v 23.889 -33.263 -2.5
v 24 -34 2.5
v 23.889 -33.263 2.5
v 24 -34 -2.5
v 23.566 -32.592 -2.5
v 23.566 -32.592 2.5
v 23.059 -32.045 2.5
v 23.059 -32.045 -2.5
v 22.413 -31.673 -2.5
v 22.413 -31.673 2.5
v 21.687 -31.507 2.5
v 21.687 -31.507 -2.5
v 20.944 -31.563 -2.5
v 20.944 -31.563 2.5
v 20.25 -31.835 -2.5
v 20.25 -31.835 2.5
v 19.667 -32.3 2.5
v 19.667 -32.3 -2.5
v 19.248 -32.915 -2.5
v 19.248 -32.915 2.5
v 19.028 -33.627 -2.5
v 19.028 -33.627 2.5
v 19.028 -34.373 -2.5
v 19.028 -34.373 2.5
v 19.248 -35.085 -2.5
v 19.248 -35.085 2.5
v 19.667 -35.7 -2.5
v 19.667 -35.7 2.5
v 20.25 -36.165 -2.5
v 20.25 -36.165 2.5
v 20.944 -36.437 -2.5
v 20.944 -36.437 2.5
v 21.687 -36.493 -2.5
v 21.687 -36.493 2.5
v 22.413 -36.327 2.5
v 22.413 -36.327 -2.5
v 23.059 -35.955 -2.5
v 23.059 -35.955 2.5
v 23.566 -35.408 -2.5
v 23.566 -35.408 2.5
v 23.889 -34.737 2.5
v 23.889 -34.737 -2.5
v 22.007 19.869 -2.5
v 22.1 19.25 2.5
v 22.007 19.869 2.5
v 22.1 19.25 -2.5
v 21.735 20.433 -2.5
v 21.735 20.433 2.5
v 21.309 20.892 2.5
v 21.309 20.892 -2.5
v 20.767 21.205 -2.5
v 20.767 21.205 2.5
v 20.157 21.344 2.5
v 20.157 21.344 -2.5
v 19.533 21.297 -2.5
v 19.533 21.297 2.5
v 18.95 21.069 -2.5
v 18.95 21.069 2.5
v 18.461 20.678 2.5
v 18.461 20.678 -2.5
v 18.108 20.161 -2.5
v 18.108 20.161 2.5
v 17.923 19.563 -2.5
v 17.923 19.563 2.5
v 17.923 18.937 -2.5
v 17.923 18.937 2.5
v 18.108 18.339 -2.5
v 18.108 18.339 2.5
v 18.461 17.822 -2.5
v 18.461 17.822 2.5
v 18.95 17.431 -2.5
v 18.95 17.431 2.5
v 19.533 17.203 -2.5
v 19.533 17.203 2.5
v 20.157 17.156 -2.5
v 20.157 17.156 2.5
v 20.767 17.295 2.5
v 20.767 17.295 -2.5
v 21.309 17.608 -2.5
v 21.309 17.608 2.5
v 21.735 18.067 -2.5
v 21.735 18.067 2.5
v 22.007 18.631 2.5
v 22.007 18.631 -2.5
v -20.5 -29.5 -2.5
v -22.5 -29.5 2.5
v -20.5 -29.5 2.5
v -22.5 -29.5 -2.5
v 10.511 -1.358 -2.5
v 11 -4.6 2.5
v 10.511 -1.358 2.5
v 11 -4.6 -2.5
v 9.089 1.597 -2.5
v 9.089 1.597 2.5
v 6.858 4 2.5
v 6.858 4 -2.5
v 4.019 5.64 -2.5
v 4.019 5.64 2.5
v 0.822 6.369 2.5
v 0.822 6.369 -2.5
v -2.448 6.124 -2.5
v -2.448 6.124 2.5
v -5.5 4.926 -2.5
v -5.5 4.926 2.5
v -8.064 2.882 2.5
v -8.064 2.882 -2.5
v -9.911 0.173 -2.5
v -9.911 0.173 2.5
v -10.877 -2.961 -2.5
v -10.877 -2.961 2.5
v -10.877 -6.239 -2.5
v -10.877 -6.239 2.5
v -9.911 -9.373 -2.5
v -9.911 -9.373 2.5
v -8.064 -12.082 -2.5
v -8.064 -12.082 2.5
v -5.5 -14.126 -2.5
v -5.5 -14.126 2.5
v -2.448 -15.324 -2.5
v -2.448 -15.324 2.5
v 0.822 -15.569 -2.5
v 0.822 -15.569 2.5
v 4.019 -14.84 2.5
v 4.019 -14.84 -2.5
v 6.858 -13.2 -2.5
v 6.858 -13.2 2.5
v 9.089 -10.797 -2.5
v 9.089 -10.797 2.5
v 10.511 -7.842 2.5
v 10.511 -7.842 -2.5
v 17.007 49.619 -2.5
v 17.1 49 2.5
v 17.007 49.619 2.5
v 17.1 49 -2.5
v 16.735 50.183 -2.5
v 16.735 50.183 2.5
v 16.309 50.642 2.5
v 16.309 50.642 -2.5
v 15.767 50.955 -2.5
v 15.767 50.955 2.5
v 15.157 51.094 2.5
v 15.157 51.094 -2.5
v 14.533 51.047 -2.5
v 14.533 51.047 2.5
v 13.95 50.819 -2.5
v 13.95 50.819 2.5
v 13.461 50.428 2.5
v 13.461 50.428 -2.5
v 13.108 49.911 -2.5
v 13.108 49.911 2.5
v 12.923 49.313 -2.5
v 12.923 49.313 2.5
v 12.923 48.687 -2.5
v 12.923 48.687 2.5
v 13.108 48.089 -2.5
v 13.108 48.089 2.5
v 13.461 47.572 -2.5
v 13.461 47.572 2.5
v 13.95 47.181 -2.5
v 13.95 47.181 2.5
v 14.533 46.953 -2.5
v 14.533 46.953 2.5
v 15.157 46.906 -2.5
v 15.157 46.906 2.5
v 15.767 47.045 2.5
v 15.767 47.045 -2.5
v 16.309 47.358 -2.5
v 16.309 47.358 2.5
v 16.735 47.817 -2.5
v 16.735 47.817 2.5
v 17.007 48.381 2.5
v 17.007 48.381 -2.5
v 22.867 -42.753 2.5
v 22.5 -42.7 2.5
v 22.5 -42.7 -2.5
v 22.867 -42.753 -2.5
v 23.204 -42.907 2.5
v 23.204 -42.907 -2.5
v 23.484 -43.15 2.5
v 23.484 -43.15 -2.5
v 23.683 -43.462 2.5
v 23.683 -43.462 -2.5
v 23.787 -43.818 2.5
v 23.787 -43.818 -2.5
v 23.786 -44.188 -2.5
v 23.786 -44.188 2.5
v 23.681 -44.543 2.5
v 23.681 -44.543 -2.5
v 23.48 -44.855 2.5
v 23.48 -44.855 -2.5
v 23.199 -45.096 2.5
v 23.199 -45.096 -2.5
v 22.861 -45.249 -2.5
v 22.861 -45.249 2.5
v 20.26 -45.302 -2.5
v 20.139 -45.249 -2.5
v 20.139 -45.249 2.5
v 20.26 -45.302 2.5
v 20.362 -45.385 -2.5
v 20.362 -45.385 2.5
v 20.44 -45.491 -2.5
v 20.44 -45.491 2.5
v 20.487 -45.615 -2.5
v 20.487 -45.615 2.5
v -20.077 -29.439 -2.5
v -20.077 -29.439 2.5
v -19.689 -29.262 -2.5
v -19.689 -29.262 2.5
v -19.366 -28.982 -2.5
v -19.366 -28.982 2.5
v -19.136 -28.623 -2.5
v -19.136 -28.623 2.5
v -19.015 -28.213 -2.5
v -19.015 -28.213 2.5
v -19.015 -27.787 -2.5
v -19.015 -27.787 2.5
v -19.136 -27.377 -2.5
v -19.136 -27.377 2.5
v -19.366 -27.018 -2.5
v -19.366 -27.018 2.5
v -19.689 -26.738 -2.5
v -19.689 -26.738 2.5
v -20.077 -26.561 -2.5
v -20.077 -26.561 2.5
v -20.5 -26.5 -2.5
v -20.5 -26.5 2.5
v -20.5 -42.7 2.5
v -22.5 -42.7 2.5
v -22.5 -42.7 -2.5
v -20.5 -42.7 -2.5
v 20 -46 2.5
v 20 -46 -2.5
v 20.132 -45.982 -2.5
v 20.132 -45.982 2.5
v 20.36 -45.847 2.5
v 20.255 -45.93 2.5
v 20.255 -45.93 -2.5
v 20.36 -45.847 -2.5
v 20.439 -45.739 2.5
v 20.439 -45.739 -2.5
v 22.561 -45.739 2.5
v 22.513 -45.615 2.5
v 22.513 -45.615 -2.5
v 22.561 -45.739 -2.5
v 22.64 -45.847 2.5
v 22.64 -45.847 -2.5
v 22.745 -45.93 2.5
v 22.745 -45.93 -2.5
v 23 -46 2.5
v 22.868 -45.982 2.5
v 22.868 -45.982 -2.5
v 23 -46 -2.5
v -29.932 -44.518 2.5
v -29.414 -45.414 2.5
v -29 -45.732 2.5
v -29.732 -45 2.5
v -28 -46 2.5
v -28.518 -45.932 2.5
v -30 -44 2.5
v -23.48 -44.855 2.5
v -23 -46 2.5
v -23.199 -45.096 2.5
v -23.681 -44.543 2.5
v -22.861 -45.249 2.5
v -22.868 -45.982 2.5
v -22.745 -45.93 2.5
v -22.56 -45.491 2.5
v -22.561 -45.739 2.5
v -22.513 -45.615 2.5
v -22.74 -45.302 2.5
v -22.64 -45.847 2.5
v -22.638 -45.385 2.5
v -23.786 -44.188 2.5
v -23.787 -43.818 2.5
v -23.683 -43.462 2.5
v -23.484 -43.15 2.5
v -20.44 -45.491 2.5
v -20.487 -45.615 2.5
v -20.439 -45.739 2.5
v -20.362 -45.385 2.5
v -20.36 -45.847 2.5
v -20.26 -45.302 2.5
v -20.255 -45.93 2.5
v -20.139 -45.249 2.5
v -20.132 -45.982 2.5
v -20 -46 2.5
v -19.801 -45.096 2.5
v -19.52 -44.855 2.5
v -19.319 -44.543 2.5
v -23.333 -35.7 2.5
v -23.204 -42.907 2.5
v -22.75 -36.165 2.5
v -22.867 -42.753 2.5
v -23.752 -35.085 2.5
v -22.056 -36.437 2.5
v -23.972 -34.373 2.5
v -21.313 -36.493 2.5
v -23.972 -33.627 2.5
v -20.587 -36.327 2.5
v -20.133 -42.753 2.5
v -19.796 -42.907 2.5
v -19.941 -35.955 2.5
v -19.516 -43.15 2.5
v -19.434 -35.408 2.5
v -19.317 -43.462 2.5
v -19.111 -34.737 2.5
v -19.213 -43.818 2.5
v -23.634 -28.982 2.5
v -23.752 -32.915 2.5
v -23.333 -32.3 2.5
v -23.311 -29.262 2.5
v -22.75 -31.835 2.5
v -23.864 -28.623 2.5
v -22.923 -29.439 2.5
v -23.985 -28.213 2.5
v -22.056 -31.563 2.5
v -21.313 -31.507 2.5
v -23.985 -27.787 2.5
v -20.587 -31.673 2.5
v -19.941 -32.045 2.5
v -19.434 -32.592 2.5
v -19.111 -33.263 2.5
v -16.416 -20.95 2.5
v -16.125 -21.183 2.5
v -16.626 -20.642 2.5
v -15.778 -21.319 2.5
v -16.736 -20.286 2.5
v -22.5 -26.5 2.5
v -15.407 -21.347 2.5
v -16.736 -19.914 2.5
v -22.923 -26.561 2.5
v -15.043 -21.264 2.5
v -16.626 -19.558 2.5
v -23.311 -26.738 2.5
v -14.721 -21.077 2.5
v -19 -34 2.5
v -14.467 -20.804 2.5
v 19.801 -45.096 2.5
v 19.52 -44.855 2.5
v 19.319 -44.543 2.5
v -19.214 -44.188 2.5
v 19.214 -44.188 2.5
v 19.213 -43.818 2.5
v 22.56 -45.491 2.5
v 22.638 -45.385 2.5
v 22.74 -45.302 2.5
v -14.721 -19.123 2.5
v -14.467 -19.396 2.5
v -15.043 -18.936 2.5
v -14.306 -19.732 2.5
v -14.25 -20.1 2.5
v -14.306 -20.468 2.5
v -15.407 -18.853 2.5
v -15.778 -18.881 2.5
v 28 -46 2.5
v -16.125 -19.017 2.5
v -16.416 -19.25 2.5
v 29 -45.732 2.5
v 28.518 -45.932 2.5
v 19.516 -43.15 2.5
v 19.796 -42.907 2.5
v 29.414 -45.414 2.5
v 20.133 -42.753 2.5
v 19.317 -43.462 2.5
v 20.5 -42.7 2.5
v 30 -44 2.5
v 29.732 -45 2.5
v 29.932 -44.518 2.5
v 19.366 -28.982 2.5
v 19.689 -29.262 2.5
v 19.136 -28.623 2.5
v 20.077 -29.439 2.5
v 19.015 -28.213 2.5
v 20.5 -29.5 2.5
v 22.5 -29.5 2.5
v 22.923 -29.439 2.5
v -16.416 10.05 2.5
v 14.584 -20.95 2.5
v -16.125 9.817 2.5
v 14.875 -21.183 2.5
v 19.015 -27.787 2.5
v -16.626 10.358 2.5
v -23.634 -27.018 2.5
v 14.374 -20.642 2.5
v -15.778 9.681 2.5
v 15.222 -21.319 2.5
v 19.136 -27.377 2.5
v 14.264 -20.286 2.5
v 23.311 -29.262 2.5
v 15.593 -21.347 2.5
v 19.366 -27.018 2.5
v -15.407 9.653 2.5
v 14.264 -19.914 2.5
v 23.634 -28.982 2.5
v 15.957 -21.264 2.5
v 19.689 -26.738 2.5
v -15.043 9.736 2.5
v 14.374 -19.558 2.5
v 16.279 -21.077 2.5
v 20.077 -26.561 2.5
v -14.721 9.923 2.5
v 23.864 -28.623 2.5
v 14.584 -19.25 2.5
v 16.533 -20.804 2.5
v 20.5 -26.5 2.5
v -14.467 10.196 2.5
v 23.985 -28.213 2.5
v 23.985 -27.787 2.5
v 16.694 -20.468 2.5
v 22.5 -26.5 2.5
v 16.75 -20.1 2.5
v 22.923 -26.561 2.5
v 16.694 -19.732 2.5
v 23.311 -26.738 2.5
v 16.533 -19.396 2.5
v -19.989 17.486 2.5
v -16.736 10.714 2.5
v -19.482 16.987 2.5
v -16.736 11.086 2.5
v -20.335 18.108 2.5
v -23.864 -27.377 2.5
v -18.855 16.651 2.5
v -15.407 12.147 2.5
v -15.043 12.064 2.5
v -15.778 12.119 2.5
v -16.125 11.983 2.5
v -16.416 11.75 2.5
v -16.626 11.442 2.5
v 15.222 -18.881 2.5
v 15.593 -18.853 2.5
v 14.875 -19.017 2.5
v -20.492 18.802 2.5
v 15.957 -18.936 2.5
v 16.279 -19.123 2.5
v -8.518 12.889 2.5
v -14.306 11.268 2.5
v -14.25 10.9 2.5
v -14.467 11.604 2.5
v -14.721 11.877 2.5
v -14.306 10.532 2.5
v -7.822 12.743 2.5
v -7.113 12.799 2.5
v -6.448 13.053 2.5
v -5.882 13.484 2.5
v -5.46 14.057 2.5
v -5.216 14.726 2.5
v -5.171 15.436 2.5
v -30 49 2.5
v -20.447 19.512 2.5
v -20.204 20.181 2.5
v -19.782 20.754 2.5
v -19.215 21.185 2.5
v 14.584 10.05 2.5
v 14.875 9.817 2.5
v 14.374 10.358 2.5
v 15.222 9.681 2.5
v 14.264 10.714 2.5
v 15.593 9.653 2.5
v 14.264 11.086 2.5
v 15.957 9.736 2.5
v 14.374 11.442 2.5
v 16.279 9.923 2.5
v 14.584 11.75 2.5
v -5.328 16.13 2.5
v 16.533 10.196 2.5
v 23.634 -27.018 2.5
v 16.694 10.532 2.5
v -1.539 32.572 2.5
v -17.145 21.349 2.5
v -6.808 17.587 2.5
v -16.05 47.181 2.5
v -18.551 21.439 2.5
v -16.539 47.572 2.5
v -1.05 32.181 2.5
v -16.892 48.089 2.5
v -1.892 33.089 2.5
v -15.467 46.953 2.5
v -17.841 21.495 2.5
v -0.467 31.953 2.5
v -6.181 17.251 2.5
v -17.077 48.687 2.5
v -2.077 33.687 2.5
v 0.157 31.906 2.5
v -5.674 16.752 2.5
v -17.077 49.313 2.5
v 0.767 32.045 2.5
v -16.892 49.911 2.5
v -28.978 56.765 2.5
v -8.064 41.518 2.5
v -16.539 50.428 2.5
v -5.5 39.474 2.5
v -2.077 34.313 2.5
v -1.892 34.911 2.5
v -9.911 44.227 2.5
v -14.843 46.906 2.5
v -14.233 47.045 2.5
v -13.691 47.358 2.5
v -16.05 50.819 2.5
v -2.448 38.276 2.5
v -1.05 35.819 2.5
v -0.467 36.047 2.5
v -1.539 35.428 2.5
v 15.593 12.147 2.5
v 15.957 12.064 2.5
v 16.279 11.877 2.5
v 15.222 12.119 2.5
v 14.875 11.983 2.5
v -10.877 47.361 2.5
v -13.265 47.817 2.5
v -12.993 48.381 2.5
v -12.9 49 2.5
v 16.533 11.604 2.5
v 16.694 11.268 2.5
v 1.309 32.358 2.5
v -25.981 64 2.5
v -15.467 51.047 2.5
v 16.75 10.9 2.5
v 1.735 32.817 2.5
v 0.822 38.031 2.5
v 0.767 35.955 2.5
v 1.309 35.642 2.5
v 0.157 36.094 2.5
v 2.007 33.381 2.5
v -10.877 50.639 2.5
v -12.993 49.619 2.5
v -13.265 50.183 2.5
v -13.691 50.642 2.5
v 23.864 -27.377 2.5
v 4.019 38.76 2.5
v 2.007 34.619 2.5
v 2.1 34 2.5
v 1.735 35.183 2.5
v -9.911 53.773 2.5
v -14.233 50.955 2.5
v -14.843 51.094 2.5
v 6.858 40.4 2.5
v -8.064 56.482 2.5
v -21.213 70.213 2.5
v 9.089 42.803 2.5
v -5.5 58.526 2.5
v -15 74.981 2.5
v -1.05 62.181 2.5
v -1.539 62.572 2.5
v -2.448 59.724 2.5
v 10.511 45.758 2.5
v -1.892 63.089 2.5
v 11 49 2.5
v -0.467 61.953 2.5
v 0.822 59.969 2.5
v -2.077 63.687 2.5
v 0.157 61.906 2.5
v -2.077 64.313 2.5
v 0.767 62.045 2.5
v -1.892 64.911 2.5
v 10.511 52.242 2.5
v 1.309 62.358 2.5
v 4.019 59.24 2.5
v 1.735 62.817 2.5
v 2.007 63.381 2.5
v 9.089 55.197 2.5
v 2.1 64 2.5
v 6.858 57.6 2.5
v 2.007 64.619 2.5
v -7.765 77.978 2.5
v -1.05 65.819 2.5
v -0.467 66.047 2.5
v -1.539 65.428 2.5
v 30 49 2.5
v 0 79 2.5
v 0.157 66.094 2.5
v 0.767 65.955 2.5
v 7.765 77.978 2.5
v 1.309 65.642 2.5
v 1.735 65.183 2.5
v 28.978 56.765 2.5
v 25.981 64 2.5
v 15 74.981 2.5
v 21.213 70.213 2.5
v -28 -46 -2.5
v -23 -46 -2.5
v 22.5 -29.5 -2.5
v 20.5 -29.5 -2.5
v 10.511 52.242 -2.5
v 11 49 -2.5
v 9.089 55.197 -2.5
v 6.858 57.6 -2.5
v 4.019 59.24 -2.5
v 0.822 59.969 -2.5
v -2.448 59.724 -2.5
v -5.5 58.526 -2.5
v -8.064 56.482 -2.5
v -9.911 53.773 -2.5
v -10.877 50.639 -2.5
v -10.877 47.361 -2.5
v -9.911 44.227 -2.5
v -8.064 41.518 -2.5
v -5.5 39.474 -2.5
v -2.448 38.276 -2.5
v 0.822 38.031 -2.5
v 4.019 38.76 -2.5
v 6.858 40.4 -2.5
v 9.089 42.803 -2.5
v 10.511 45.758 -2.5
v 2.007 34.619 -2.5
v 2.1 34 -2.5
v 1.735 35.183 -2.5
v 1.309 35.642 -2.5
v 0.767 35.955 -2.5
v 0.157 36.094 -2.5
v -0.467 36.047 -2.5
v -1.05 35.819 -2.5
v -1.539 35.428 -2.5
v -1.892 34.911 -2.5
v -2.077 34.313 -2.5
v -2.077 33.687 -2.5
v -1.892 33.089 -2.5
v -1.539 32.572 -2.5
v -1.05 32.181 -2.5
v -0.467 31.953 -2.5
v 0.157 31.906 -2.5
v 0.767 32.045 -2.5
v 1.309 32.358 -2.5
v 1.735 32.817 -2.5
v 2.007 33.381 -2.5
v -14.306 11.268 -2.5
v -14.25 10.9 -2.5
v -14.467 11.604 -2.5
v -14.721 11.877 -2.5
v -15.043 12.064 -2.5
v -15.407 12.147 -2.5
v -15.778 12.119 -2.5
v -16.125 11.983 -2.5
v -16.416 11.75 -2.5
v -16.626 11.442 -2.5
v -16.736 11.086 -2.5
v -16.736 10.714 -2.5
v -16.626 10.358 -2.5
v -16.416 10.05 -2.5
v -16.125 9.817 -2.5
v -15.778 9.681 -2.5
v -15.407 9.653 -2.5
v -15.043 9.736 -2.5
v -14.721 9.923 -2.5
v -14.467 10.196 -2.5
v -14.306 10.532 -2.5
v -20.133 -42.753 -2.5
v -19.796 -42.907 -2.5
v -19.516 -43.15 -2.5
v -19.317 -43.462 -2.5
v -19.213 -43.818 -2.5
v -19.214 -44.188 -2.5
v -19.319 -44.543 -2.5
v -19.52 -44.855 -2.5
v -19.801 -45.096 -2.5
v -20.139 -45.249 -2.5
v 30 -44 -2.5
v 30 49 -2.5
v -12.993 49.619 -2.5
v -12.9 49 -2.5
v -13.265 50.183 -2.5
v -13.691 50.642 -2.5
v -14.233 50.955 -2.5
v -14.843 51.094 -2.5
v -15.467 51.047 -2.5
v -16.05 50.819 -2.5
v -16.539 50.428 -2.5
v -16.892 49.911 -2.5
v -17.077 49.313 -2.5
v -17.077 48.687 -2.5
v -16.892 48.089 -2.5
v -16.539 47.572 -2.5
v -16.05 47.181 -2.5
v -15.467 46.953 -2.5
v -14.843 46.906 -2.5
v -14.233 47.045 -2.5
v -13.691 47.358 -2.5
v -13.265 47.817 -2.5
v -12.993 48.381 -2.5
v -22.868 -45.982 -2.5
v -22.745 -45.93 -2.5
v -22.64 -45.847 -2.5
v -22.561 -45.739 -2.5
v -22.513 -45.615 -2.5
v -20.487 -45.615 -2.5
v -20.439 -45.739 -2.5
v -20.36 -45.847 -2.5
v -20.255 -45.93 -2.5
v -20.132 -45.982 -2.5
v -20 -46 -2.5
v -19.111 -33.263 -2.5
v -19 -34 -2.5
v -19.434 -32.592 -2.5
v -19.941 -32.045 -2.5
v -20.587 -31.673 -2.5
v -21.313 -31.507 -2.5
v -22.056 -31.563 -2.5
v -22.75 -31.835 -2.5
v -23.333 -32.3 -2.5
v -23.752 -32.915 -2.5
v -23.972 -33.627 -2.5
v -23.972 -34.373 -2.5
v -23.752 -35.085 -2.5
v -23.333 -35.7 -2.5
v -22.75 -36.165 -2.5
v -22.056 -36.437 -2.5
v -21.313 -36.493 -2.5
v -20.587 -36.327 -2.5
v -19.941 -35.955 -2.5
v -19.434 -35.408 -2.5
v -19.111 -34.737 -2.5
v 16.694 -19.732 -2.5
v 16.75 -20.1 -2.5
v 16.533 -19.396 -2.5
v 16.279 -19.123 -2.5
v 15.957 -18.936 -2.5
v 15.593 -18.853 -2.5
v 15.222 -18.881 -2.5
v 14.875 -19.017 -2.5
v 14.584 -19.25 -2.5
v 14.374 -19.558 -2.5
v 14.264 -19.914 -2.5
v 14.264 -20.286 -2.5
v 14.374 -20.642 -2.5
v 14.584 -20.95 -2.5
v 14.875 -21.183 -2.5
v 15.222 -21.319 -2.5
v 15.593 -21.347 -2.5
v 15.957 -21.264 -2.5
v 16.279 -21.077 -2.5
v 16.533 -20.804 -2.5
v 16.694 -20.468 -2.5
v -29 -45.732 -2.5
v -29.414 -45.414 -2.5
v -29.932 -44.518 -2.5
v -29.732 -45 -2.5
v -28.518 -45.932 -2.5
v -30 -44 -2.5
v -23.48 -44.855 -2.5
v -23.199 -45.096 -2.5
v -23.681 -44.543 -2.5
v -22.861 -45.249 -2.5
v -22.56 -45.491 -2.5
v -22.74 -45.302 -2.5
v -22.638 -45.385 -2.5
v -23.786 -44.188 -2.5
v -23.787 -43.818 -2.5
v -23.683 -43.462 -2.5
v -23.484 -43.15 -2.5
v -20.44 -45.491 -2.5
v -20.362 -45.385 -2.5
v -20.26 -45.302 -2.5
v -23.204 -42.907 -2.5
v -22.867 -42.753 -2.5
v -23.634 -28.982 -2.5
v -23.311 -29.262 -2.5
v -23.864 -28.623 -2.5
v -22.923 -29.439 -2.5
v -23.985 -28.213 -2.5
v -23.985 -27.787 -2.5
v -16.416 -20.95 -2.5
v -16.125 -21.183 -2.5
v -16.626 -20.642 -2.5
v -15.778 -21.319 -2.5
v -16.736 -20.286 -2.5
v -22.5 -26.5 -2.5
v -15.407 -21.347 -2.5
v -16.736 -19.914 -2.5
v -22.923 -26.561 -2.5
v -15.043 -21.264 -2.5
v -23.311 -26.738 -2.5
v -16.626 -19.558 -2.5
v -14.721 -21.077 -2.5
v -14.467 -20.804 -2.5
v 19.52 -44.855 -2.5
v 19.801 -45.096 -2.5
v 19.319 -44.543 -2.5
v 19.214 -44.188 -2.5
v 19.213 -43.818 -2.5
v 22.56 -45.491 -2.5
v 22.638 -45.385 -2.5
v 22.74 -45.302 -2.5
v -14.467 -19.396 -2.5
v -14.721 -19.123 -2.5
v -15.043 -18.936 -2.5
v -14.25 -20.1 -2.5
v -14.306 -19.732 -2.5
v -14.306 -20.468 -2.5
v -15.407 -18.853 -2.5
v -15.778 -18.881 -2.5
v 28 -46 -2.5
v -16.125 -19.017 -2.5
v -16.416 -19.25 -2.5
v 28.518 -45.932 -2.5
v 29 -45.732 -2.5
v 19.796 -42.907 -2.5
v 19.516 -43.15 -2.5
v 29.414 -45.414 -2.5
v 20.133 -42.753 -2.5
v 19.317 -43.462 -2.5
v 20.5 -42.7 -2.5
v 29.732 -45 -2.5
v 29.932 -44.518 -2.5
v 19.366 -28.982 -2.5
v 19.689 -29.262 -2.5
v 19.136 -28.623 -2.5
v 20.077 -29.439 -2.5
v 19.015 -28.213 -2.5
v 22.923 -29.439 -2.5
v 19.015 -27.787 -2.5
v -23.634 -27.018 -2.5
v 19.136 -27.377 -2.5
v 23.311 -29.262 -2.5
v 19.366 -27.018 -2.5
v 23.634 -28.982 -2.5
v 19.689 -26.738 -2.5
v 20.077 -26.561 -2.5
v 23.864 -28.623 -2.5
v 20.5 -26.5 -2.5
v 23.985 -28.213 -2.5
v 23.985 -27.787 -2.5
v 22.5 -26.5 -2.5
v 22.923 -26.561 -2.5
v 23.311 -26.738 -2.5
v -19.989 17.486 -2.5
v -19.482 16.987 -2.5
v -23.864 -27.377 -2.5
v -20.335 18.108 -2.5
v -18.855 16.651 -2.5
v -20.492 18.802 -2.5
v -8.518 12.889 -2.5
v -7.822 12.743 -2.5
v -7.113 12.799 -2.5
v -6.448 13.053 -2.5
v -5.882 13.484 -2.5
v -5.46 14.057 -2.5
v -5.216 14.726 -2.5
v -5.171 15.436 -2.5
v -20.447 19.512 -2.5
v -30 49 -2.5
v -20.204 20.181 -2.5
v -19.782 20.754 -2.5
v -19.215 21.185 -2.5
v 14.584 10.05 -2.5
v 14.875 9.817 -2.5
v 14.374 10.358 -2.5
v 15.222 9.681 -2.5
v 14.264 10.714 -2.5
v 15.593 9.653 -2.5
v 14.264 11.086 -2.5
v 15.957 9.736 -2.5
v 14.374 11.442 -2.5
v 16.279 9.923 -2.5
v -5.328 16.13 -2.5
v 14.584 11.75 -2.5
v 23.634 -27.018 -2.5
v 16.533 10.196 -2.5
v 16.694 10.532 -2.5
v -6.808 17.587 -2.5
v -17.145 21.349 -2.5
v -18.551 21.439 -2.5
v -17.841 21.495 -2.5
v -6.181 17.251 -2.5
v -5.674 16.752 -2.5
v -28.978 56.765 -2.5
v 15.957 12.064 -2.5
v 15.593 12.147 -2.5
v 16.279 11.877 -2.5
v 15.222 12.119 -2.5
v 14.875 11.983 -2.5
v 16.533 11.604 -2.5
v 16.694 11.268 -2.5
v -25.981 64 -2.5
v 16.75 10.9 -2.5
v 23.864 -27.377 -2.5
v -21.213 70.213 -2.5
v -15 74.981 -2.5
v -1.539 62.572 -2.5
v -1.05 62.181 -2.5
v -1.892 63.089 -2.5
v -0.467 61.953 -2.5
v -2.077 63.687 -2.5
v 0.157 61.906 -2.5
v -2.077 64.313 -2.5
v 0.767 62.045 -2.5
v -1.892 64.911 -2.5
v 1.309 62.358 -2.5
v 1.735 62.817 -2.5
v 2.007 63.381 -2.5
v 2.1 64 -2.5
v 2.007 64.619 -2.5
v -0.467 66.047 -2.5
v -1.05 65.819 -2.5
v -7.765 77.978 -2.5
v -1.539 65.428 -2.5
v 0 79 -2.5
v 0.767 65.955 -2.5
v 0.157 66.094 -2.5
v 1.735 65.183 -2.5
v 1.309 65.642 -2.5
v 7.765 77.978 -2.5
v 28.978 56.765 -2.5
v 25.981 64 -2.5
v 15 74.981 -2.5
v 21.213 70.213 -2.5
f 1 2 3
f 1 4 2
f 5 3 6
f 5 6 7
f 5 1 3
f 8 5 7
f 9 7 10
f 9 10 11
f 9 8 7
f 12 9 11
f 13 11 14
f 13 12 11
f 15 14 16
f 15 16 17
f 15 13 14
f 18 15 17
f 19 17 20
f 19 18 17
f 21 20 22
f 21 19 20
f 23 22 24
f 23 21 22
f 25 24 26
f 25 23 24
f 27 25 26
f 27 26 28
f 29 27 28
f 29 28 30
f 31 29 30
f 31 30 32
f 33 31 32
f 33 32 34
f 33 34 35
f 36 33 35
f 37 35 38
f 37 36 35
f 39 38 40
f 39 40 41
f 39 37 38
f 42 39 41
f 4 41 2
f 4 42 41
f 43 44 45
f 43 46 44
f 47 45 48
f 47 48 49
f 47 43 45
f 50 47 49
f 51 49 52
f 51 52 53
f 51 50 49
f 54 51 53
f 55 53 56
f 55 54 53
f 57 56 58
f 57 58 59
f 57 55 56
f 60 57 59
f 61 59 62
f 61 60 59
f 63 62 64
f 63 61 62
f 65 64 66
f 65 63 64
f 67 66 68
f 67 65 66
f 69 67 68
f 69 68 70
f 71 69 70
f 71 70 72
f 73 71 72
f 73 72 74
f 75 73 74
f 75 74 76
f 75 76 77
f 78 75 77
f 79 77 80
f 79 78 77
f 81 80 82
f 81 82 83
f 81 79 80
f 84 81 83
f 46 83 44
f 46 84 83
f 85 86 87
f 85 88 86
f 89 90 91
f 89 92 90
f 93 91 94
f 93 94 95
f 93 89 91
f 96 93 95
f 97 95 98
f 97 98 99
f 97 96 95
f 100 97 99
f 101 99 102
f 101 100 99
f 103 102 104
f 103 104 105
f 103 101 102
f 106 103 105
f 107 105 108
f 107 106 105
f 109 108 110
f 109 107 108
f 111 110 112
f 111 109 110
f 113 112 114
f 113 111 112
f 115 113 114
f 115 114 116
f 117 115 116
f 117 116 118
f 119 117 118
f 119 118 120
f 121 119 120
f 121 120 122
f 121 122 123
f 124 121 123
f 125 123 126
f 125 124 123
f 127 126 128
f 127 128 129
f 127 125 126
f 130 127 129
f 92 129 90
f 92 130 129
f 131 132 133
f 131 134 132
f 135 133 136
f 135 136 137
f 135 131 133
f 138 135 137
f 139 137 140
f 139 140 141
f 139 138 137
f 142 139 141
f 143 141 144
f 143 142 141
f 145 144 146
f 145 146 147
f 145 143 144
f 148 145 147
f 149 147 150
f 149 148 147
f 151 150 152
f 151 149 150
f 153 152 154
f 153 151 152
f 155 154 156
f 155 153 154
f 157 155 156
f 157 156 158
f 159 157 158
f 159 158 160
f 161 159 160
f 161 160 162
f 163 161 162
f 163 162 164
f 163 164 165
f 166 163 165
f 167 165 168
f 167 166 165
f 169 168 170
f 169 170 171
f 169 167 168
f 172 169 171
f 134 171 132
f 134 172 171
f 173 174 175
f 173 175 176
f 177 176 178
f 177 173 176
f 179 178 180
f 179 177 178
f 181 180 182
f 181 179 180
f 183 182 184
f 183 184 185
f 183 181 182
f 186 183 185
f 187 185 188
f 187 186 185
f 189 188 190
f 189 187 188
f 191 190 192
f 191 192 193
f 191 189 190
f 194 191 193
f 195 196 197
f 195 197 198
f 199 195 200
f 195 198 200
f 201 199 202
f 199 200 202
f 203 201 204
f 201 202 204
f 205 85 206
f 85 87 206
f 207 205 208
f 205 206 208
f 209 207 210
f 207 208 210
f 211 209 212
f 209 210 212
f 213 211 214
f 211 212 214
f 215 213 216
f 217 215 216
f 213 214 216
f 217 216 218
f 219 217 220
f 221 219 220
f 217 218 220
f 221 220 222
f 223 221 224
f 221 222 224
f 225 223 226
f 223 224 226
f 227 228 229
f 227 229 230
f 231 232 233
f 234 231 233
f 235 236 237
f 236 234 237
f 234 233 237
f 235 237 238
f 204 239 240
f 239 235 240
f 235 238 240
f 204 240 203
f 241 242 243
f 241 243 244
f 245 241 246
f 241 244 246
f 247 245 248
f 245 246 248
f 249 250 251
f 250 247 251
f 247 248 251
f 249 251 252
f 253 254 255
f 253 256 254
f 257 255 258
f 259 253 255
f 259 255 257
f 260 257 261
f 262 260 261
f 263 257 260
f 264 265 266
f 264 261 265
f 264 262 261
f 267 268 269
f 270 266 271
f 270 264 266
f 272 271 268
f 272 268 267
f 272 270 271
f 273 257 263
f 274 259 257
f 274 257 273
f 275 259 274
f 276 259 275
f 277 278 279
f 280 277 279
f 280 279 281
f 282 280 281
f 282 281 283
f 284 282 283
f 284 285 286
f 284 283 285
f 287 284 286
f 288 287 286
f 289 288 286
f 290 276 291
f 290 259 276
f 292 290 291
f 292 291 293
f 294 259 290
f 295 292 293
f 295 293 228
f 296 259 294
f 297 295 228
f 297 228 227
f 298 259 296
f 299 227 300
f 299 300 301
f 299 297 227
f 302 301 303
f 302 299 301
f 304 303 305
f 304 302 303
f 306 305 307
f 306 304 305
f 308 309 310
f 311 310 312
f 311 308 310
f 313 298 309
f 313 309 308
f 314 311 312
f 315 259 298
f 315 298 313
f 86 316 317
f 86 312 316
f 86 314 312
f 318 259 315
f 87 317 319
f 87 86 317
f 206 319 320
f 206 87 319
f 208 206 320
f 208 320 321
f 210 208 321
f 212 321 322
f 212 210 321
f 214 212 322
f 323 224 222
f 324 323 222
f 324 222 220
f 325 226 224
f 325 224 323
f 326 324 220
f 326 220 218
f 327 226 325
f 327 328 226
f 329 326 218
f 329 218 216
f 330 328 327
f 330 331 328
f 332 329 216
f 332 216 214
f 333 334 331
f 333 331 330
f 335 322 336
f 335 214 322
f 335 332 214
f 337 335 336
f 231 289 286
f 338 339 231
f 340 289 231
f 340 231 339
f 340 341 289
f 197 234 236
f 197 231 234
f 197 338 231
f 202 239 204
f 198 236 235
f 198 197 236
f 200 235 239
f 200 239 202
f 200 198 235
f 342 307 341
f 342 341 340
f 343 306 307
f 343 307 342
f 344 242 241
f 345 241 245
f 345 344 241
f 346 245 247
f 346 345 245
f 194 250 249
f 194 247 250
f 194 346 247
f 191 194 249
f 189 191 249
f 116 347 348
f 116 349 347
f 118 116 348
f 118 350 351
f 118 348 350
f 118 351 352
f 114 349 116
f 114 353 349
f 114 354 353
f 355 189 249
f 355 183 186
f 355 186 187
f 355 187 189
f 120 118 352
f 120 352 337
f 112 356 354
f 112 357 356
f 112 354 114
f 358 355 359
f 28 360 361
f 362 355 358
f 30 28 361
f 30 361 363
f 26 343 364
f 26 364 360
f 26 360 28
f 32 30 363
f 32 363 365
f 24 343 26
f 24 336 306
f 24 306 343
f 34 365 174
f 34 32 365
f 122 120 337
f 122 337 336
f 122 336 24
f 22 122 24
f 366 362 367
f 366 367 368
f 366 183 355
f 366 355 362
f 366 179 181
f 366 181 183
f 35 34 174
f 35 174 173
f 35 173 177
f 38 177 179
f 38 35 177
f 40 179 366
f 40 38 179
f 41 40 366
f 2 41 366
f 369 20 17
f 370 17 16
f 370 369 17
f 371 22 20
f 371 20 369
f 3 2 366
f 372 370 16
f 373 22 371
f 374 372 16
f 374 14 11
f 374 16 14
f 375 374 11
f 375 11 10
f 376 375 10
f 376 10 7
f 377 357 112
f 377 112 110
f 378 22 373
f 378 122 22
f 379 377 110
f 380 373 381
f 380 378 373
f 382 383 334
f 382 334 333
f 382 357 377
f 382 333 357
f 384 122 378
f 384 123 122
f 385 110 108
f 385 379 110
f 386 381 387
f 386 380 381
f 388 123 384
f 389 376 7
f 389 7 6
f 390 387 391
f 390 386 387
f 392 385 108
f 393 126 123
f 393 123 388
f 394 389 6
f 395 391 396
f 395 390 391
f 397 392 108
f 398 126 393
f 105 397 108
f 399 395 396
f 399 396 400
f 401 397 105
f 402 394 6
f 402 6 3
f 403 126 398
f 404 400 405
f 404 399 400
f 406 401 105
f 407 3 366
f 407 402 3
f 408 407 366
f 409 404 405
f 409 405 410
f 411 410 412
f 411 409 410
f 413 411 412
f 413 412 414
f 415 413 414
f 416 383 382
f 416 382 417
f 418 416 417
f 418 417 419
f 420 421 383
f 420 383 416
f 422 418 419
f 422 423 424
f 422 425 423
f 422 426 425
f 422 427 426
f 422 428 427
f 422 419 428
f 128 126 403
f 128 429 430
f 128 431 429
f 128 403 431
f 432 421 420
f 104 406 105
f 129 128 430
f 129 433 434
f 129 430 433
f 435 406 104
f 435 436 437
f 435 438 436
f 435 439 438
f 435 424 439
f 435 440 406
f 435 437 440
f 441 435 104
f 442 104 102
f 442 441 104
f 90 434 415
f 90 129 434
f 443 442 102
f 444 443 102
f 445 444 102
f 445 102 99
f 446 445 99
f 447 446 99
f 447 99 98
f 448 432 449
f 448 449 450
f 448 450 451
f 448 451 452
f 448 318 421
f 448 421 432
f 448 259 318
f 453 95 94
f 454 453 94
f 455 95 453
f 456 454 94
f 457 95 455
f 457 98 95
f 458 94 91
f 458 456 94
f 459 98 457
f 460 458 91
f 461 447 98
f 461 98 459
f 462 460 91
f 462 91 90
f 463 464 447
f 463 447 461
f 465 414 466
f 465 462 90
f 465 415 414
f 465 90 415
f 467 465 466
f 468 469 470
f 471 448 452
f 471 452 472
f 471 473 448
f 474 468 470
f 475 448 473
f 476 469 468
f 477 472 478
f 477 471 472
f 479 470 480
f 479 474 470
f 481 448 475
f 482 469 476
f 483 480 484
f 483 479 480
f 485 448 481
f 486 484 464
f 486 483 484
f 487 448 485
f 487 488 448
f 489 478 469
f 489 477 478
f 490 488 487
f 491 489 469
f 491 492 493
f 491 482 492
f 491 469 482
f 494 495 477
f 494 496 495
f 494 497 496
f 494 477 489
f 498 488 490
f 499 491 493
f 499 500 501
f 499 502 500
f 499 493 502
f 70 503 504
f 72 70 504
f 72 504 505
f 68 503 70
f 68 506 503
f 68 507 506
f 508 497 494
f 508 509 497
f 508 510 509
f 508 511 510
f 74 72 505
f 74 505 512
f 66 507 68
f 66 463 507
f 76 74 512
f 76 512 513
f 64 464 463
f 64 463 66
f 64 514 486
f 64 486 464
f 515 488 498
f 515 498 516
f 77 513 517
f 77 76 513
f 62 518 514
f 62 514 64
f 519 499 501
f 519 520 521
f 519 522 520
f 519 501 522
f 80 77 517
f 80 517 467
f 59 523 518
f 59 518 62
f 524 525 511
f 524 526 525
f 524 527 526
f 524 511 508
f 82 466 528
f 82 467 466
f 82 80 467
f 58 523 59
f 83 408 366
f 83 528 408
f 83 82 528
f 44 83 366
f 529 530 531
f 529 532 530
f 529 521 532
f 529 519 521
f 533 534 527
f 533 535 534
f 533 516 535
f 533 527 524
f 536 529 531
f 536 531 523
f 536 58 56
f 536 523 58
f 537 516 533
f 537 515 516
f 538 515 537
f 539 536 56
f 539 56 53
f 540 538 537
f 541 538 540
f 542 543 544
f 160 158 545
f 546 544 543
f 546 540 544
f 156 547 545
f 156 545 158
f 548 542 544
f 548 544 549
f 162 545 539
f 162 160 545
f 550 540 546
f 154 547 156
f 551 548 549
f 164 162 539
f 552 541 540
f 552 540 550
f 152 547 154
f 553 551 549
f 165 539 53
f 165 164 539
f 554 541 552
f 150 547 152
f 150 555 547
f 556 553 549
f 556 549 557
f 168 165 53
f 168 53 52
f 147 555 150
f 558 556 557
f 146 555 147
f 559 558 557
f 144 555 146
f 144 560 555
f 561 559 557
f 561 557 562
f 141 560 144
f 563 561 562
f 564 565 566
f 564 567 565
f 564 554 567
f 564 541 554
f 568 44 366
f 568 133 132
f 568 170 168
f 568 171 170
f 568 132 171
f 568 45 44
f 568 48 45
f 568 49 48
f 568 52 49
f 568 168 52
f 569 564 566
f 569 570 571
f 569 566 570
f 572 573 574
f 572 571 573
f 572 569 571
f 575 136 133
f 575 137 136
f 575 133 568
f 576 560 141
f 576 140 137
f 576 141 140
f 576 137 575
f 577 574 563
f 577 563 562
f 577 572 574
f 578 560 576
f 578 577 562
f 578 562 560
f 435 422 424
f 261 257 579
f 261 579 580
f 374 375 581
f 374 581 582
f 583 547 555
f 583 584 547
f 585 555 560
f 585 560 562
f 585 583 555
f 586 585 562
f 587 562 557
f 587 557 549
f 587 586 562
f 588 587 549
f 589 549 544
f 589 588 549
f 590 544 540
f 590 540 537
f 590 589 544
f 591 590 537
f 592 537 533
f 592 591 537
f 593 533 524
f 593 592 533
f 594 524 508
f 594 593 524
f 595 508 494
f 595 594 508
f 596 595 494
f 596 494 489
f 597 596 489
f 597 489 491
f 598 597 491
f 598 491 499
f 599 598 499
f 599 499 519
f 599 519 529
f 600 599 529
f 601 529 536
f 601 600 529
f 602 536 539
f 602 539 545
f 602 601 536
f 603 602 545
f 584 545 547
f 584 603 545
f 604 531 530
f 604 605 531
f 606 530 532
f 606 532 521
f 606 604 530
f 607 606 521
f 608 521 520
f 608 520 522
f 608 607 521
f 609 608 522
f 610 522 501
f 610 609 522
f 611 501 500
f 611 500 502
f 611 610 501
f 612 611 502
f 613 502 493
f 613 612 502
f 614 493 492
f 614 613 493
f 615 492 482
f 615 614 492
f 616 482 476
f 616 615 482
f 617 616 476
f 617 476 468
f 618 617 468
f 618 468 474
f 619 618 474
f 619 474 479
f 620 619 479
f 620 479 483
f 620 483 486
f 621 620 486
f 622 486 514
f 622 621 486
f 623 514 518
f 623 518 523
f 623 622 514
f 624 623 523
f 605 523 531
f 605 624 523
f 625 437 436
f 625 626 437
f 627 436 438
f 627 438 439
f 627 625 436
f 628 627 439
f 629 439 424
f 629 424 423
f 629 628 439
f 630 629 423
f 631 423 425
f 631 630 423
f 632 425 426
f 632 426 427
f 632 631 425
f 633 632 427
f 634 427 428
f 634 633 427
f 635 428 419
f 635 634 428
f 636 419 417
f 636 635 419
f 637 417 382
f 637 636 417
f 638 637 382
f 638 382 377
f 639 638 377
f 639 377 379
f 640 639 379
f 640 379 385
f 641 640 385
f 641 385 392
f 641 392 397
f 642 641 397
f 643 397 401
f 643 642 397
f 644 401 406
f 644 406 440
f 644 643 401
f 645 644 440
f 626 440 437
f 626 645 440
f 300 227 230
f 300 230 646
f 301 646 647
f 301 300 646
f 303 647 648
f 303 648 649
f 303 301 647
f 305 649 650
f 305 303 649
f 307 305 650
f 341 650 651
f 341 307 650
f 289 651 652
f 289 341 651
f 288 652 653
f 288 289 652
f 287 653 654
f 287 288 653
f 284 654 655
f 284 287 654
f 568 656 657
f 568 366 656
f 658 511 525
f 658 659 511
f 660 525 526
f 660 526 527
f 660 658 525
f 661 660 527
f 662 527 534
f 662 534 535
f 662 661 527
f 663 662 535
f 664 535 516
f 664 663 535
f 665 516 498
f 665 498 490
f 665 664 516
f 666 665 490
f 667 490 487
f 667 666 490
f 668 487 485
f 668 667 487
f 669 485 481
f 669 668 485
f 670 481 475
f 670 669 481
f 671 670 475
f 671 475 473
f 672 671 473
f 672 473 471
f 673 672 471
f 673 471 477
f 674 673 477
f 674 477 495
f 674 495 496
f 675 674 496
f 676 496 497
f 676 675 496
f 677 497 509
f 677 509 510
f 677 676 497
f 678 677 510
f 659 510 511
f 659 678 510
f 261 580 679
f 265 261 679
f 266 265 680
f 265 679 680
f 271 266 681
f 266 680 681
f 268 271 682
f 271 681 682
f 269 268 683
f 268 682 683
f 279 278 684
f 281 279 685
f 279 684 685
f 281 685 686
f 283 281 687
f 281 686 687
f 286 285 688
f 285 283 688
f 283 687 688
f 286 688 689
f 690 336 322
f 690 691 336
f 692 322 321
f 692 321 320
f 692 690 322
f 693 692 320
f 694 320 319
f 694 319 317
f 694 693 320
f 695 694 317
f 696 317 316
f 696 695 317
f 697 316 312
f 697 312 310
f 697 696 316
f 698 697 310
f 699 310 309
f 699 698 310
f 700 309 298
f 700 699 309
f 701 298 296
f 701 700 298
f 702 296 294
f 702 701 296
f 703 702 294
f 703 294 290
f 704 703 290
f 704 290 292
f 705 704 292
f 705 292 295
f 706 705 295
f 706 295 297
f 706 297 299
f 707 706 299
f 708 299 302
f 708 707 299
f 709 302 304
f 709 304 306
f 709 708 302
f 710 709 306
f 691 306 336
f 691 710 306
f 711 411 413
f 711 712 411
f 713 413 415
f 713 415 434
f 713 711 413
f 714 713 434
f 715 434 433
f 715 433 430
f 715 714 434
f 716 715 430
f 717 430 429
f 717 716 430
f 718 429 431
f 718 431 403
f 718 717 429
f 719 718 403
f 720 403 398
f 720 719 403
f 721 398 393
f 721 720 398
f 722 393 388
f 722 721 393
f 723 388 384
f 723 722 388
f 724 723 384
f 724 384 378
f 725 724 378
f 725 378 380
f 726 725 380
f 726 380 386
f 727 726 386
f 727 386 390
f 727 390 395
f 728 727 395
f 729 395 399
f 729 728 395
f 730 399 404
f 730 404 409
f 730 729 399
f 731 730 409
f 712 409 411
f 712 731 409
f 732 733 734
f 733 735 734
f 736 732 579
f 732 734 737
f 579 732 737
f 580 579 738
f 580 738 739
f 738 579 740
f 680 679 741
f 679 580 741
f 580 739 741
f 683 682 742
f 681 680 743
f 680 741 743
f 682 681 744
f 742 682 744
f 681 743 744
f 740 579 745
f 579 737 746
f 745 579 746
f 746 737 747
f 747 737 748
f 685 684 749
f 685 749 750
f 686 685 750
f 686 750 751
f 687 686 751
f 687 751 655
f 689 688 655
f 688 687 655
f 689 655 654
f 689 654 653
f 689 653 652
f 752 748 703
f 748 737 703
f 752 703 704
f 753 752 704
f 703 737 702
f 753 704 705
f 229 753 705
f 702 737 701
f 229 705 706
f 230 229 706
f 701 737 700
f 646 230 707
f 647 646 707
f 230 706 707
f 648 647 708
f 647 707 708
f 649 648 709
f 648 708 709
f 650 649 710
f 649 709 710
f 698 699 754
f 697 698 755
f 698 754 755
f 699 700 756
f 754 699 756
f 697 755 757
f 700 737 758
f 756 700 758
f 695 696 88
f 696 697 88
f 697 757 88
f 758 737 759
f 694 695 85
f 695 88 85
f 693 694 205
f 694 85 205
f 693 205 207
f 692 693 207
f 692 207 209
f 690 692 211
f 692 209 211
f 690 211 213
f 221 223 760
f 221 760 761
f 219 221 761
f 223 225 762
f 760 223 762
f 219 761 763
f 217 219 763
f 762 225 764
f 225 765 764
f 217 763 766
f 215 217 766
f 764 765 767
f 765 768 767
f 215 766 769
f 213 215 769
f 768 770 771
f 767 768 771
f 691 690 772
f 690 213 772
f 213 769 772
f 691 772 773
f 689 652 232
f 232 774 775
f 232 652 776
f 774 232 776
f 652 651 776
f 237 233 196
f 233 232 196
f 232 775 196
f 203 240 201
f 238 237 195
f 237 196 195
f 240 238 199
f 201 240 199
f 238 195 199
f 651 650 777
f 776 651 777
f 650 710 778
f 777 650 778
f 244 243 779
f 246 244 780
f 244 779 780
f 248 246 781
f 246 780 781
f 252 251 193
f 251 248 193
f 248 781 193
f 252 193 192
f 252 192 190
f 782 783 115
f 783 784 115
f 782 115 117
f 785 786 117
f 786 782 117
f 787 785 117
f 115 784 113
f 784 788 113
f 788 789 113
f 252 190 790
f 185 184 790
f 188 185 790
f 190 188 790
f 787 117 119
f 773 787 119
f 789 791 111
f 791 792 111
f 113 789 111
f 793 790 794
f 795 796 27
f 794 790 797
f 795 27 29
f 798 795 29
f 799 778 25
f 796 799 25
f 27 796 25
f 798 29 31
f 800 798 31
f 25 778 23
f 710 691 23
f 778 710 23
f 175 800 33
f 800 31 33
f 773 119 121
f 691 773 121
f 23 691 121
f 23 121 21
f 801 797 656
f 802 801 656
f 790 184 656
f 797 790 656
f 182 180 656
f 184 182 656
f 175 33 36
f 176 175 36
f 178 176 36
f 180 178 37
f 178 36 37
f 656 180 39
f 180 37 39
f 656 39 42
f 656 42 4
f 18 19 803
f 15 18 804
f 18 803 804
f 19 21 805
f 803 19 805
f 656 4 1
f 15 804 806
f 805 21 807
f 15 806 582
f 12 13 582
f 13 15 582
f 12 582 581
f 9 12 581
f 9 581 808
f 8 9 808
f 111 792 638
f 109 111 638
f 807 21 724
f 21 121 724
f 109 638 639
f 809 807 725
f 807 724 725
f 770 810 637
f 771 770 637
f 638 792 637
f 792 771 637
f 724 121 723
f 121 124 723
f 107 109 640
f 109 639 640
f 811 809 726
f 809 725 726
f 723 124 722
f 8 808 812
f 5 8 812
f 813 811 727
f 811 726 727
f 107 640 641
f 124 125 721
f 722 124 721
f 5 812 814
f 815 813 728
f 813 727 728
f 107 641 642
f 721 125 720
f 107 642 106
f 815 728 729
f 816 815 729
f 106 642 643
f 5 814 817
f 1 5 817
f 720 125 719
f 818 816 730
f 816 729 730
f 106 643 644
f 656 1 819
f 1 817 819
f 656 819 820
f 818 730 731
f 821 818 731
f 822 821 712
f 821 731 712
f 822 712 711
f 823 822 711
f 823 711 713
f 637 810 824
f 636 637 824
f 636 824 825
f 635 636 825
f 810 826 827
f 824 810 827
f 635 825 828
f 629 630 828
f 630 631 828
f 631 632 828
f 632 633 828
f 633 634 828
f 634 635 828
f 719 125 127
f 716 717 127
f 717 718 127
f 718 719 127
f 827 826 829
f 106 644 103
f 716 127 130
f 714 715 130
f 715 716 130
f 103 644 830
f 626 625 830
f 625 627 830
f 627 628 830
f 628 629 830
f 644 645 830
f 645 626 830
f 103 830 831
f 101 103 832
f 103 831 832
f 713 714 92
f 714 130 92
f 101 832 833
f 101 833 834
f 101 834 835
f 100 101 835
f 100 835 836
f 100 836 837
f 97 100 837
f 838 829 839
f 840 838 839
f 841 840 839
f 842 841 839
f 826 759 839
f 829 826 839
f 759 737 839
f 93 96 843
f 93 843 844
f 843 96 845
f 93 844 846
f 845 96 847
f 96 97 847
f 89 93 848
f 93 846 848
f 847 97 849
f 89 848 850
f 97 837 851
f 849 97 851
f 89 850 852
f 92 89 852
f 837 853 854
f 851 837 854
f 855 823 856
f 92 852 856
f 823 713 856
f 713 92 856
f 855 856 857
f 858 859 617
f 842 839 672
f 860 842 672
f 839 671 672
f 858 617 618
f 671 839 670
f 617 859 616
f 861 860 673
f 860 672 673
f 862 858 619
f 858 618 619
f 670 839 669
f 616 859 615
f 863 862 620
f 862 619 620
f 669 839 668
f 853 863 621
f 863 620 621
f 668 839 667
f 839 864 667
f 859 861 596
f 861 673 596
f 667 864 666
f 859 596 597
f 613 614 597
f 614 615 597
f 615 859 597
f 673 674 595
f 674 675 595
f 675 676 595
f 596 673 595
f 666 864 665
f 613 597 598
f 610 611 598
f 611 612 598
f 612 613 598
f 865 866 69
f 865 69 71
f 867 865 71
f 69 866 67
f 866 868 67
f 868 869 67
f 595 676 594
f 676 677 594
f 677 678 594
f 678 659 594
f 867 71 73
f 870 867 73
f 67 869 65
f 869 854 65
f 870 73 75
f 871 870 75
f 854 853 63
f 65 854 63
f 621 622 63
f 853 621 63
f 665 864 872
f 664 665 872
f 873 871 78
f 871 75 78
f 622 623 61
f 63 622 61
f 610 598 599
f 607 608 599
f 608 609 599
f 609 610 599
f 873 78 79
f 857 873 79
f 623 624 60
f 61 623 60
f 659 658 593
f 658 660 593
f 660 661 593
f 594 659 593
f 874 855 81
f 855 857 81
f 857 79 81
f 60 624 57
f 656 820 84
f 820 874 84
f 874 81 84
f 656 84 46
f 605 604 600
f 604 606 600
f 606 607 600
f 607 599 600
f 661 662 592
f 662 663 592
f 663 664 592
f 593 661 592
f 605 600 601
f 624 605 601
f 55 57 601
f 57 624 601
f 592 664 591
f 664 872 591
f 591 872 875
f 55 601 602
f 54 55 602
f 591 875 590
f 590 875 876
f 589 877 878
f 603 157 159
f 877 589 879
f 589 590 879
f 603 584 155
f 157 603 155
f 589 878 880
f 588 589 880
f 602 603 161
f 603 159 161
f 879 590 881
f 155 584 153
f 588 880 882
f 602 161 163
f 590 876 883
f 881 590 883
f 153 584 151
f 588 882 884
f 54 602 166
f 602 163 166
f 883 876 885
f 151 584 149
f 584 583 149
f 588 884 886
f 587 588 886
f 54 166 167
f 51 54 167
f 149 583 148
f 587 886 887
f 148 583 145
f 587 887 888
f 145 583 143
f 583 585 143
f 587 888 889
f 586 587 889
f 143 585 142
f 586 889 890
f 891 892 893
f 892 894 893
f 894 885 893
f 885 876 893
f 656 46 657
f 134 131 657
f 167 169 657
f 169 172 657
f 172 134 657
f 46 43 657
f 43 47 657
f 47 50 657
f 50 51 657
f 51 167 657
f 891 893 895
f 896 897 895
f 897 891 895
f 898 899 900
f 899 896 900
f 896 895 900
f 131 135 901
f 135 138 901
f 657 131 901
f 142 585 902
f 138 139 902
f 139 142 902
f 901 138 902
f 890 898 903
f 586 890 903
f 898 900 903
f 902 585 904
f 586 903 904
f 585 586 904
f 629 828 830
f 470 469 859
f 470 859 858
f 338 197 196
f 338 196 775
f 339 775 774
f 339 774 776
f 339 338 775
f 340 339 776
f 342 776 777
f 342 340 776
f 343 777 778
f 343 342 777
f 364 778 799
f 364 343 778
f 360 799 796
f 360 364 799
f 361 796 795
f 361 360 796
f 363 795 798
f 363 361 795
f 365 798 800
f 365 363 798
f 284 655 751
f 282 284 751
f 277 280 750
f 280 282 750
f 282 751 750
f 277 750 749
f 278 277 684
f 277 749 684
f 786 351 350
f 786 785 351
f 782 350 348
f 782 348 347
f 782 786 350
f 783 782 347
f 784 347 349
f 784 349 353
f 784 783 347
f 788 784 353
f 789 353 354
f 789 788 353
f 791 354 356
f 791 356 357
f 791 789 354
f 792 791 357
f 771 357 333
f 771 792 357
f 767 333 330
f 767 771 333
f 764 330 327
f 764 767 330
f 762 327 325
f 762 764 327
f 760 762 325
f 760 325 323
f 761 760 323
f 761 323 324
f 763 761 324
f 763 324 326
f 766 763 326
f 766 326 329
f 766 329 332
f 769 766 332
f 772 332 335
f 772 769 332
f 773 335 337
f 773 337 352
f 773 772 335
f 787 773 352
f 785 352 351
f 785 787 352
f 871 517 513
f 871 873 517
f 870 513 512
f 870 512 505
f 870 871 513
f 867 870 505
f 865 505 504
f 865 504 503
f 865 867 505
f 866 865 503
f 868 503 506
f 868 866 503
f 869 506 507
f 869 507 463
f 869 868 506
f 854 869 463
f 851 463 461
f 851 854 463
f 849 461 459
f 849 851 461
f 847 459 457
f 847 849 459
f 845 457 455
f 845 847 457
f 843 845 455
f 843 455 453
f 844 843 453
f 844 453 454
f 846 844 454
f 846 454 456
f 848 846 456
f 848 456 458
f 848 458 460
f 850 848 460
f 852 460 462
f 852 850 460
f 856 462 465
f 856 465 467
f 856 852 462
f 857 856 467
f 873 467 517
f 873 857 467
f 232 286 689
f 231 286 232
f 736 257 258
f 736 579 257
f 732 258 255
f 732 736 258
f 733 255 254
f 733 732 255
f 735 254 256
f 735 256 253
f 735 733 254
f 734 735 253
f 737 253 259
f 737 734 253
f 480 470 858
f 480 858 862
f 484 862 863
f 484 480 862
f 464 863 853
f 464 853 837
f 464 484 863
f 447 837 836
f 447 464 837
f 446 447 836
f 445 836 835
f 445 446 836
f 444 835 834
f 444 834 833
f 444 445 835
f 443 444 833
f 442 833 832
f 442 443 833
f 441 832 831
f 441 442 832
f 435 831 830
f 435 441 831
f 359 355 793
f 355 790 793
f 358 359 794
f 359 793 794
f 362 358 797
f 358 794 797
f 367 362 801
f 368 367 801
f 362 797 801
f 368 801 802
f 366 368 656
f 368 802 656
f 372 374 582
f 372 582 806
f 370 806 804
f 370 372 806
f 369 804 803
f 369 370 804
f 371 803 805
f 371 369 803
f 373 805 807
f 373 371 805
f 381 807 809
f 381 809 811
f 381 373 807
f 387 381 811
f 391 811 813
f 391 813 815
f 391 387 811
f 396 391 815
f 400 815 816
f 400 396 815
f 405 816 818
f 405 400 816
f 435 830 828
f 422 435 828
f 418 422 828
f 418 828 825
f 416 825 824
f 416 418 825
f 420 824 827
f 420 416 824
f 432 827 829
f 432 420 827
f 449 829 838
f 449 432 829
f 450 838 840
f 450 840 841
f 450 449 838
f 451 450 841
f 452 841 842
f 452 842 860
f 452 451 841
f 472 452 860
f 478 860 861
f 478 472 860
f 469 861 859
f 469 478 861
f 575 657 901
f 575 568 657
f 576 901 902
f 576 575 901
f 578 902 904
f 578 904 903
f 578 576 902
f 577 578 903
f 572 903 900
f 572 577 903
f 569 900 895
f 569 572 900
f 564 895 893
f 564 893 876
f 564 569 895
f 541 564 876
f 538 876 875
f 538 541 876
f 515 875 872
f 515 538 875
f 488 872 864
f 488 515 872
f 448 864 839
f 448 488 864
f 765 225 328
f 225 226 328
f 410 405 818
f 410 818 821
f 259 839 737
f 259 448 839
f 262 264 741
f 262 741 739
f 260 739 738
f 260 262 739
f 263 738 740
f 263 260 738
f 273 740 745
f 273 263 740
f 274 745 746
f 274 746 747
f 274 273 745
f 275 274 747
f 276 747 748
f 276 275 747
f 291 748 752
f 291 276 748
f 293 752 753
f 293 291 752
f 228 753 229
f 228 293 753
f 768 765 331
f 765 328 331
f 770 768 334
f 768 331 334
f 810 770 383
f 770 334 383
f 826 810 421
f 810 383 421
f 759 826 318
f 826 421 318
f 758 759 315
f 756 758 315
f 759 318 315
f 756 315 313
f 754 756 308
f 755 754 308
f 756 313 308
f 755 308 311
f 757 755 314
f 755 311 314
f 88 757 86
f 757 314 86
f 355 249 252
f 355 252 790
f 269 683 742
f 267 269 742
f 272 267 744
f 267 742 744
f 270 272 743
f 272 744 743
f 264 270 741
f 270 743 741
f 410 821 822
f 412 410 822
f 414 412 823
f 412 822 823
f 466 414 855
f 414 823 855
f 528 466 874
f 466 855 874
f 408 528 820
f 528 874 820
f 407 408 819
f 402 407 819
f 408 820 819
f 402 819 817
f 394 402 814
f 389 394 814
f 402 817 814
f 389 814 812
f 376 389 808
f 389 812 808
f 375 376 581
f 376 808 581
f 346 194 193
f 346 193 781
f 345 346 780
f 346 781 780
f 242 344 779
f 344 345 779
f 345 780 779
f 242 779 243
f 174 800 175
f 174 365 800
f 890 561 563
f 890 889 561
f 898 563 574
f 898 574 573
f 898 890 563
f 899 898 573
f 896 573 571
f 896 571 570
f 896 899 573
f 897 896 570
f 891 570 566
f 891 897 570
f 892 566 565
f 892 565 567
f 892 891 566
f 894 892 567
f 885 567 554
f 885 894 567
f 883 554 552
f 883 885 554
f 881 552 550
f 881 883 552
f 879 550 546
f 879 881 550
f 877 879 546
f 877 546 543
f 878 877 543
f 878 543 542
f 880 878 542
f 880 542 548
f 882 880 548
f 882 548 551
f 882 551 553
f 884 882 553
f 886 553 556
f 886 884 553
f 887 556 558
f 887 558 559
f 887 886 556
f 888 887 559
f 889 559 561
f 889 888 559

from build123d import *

# Parameters (mm, degrees)
SKETCH1_R           = 11
SKETCH1_R_2         = 1.25
SKETCH1_R_3         = 2.5
SKETCH1_R_4         = 2.1
BOSS_EXTRUDE1_DEPTH = 2.5
FILLET1_R           = 0.5
FILLET2_R           = 2


with BuildPart() as part:
    # Sketch1 → Boss-Extrude1 (new, symmetric)
    with BuildSketch(Plane.XY):
        with BuildLine():
            Line((-30, -46), (-22.5, -46))
            Line((-22.5, -46), (-22.5, -45.3))
            ThreePointArc((-22.5, -45.3), (-23.8, -44), (-22.5, -42.7))
            Line((-22.5, -42.7), (-20.5, -42.7))
            ThreePointArc((-20.5, -42.7), (-19.2, -44), (-20.5, -45.3))
            Line((-20.5, -45.3), (-20.5, -46))
            Line((-20.5, -46), (20.5, -46))
            Line((20.5, -46), (20.5, -45.3))
            ThreePointArc((20.5, -45.3), (19.2, -44), (20.5, -42.7))
            Line((20.5, -42.7), (22.5, -42.7))
            ThreePointArc((22.5, -42.7), (23.8, -44), (22.5, -45.3))
            Line((22.5, -45.3), (22.5, -46))
            Line((22.5, -46), (30, -46))
            Line((30, -46), (30, 49))
            ThreePointArc((30, 49), (0, 79), (-30, 49))
            Line((-30, 49), (-30, -46))
        make_face()
        with Locations((0, -4.6)):
            Circle(SKETCH1_R, mode=Mode.SUBTRACT)
        with Locations((15.5, 10.9)):
            Circle(SKETCH1_R_2, mode=Mode.SUBTRACT)
        with Locations((15.5, -20.1)):
            Circle(SKETCH1_R_2, mode=Mode.SUBTRACT)
        with Locations((-15.5, -20.1)):
            Circle(SKETCH1_R_2, mode=Mode.SUBTRACT)
        with Locations((-15.5, 10.9)):
            Circle(SKETCH1_R_2, mode=Mode.SUBTRACT)
        with Locations((0, 49)):
            Circle(SKETCH1_R, mode=Mode.SUBTRACT)
        with Locations((21.5, -34)):
            Circle(SKETCH1_R_3, mode=Mode.SUBTRACT)
        with Locations((-21.5, -34)):
            Circle(SKETCH1_R_3, mode=Mode.SUBTRACT)
        with Locations((0, 64)):
            Circle(SKETCH1_R_4, mode=Mode.SUBTRACT)
        with Locations((-15, 49)):
            Circle(SKETCH1_R_4, mode=Mode.SUBTRACT)
        with Locations((0, 34)):
            Circle(SKETCH1_R_4, mode=Mode.SUBTRACT)
        with Locations((15, 49)):
            Circle(SKETCH1_R_4, mode=Mode.SUBTRACT)
        with Locations((20, 19.25)):
            Circle(SKETCH1_R_4, mode=Mode.SUBTRACT)
        with BuildLine():
            Line((20.5, -26.5), (22.5, -26.5))
            ThreePointArc((22.5, -26.5), (24, -28), (22.5, -29.5))
            Line((22.5, -29.5), (20.5, -29.5))
            ThreePointArc((20.5, -29.5), (19, -28), (20.5, -26.5))
        make_face(mode=Mode.SUBTRACT)
        with BuildLine():
            Line((-20.5, -26.5), (-22.5, -26.5))
            ThreePointArc((-22.5, -26.5), (-24, -28), (-22.5, -29.5))
            Line((-22.5, -29.5), (-20.5, -29.5))
            ThreePointArc((-20.5, -29.5), (-19, -28), (-20.5, -26.5))
        make_face(mode=Mode.SUBTRACT)
        with BuildLine():
            Line((-8.51843153, 12.888546871), (-18.855050358, 16.650768448))
            ThreePointArc((-18.855050358, 16.650768448), (-20.349231552, 19.855050358), (-17.144949642, 21.349231552))
            Line((-17.144949642, 21.349231552), (-6.808330813, 17.587009975))
            ThreePointArc((-6.808330813, 17.587009975), (-5.314149619, 14.382728065), (-8.51843153, 12.888546871))
        make_face(mode=Mode.SUBTRACT)
    extrude(amount=BOSS_EXTRUDE1_DEPTH, both=True)

    # Fillet1
    # the kernel refuses this fillet: 0.5 mm, written as the material it takes off along each edge
    with BuildSketch(Plane(origin=(-22.5, -46, -3.75), x_dir=(0, 1, 0), z_dir=(0, 0, 1)), Plane(origin=(-20.5, -46, -3.75), x_dir=(1, 0, 0), z_dir=(0, 0, 1)), Plane(origin=(20.5, -46, -3.75), x_dir=(0, 1, 0), z_dir=(0, 0, 1)), Plane(origin=(22.5, -46, -3.75), x_dir=(1, 0, 0), z_dir=(0, 0, 1))) as fillet1_piece_1:
        with BuildLine():
            CenterArc((FILLET1_R, FILLET1_R), FILLET1_R, 180, 90)
            Line((0, FILLET1_R), (0, 0))
            Line((0, 0), (FILLET1_R, 0))
        make_face()
    extrude(amount=7.5, mode=Mode.SUBTRACT)
    with BuildSketch(Plane(origin=(-22.5, -45.3, -3.572904116), x_dir=(-0.990112458059838, 0.14027587246103826, 0), z_dir=(0, 0, 1))) as fillet1_piece_2:
        with BuildLine():
            CenterArc((0.434855205, 0.495056229), FILLET1_R, 188.063810107, 73.872379787)
            Line((-0.060201024, 0.424918293), (0, 0))
            ThreePointArc((0, 0), (0.182358634, 0.012853805), (0.364717268, 0))
        make_face()
    extrude(amount=7.145808233, mode=Mode.SUBTRACT)
    with BuildSketch(Plane(origin=(-20.5, -45.3, -3.572904116), x_dir=(0, -1, 0), z_dir=(0, 0, 1))) as fillet1_piece_3:
        with BuildLine():
            CenterArc((0.429161647, 0.5), FILLET1_R, 196.127620213, 73.872379787)
            ThreePointArc((-0.051161033, 0.361111111), (-0.012853805, 0.182358634), (0, 0))
            Line((0, 0), (0.429161647, 0))
        make_face()
    extrude(amount=7.145808233, mode=Mode.SUBTRACT)
    with BuildSketch(Plane(origin=(20.5, -45.3, 3.572904116), x_dir=(-0.9901124580598404, 0.14027587246102047, 0), z_dir=(0, 0, -1)), Plane(origin=(22.5, -45.3, -3.572904116), x_dir=(0.9901124580598378, 0.1402758724610396, 0), z_dir=(0, 0, 1))) as fillet1_piece_4:
        with BuildLine():
            CenterArc((0.434855205, -0.495056229), FILLET1_R, 98.063810107, 73.872379787)
            Line((-0.060201024, -0.424918293), (0, 0))
            ThreePointArc((0, 0), (0.182358634, -0.012853805), (0.364717268, 0))
        make_face()
    extrude(amount=7.145808233, mode=Mode.SUBTRACT)

    # Fillet2
    fillet2_edges = [part.edges().sort_by_distance(p)[0] for p in [
        (30, -46, 0),
        (-30, -46, 0),
    ]]
    fillet(fillet2_edges, radius=FILLET2_R)


solid = part.part
